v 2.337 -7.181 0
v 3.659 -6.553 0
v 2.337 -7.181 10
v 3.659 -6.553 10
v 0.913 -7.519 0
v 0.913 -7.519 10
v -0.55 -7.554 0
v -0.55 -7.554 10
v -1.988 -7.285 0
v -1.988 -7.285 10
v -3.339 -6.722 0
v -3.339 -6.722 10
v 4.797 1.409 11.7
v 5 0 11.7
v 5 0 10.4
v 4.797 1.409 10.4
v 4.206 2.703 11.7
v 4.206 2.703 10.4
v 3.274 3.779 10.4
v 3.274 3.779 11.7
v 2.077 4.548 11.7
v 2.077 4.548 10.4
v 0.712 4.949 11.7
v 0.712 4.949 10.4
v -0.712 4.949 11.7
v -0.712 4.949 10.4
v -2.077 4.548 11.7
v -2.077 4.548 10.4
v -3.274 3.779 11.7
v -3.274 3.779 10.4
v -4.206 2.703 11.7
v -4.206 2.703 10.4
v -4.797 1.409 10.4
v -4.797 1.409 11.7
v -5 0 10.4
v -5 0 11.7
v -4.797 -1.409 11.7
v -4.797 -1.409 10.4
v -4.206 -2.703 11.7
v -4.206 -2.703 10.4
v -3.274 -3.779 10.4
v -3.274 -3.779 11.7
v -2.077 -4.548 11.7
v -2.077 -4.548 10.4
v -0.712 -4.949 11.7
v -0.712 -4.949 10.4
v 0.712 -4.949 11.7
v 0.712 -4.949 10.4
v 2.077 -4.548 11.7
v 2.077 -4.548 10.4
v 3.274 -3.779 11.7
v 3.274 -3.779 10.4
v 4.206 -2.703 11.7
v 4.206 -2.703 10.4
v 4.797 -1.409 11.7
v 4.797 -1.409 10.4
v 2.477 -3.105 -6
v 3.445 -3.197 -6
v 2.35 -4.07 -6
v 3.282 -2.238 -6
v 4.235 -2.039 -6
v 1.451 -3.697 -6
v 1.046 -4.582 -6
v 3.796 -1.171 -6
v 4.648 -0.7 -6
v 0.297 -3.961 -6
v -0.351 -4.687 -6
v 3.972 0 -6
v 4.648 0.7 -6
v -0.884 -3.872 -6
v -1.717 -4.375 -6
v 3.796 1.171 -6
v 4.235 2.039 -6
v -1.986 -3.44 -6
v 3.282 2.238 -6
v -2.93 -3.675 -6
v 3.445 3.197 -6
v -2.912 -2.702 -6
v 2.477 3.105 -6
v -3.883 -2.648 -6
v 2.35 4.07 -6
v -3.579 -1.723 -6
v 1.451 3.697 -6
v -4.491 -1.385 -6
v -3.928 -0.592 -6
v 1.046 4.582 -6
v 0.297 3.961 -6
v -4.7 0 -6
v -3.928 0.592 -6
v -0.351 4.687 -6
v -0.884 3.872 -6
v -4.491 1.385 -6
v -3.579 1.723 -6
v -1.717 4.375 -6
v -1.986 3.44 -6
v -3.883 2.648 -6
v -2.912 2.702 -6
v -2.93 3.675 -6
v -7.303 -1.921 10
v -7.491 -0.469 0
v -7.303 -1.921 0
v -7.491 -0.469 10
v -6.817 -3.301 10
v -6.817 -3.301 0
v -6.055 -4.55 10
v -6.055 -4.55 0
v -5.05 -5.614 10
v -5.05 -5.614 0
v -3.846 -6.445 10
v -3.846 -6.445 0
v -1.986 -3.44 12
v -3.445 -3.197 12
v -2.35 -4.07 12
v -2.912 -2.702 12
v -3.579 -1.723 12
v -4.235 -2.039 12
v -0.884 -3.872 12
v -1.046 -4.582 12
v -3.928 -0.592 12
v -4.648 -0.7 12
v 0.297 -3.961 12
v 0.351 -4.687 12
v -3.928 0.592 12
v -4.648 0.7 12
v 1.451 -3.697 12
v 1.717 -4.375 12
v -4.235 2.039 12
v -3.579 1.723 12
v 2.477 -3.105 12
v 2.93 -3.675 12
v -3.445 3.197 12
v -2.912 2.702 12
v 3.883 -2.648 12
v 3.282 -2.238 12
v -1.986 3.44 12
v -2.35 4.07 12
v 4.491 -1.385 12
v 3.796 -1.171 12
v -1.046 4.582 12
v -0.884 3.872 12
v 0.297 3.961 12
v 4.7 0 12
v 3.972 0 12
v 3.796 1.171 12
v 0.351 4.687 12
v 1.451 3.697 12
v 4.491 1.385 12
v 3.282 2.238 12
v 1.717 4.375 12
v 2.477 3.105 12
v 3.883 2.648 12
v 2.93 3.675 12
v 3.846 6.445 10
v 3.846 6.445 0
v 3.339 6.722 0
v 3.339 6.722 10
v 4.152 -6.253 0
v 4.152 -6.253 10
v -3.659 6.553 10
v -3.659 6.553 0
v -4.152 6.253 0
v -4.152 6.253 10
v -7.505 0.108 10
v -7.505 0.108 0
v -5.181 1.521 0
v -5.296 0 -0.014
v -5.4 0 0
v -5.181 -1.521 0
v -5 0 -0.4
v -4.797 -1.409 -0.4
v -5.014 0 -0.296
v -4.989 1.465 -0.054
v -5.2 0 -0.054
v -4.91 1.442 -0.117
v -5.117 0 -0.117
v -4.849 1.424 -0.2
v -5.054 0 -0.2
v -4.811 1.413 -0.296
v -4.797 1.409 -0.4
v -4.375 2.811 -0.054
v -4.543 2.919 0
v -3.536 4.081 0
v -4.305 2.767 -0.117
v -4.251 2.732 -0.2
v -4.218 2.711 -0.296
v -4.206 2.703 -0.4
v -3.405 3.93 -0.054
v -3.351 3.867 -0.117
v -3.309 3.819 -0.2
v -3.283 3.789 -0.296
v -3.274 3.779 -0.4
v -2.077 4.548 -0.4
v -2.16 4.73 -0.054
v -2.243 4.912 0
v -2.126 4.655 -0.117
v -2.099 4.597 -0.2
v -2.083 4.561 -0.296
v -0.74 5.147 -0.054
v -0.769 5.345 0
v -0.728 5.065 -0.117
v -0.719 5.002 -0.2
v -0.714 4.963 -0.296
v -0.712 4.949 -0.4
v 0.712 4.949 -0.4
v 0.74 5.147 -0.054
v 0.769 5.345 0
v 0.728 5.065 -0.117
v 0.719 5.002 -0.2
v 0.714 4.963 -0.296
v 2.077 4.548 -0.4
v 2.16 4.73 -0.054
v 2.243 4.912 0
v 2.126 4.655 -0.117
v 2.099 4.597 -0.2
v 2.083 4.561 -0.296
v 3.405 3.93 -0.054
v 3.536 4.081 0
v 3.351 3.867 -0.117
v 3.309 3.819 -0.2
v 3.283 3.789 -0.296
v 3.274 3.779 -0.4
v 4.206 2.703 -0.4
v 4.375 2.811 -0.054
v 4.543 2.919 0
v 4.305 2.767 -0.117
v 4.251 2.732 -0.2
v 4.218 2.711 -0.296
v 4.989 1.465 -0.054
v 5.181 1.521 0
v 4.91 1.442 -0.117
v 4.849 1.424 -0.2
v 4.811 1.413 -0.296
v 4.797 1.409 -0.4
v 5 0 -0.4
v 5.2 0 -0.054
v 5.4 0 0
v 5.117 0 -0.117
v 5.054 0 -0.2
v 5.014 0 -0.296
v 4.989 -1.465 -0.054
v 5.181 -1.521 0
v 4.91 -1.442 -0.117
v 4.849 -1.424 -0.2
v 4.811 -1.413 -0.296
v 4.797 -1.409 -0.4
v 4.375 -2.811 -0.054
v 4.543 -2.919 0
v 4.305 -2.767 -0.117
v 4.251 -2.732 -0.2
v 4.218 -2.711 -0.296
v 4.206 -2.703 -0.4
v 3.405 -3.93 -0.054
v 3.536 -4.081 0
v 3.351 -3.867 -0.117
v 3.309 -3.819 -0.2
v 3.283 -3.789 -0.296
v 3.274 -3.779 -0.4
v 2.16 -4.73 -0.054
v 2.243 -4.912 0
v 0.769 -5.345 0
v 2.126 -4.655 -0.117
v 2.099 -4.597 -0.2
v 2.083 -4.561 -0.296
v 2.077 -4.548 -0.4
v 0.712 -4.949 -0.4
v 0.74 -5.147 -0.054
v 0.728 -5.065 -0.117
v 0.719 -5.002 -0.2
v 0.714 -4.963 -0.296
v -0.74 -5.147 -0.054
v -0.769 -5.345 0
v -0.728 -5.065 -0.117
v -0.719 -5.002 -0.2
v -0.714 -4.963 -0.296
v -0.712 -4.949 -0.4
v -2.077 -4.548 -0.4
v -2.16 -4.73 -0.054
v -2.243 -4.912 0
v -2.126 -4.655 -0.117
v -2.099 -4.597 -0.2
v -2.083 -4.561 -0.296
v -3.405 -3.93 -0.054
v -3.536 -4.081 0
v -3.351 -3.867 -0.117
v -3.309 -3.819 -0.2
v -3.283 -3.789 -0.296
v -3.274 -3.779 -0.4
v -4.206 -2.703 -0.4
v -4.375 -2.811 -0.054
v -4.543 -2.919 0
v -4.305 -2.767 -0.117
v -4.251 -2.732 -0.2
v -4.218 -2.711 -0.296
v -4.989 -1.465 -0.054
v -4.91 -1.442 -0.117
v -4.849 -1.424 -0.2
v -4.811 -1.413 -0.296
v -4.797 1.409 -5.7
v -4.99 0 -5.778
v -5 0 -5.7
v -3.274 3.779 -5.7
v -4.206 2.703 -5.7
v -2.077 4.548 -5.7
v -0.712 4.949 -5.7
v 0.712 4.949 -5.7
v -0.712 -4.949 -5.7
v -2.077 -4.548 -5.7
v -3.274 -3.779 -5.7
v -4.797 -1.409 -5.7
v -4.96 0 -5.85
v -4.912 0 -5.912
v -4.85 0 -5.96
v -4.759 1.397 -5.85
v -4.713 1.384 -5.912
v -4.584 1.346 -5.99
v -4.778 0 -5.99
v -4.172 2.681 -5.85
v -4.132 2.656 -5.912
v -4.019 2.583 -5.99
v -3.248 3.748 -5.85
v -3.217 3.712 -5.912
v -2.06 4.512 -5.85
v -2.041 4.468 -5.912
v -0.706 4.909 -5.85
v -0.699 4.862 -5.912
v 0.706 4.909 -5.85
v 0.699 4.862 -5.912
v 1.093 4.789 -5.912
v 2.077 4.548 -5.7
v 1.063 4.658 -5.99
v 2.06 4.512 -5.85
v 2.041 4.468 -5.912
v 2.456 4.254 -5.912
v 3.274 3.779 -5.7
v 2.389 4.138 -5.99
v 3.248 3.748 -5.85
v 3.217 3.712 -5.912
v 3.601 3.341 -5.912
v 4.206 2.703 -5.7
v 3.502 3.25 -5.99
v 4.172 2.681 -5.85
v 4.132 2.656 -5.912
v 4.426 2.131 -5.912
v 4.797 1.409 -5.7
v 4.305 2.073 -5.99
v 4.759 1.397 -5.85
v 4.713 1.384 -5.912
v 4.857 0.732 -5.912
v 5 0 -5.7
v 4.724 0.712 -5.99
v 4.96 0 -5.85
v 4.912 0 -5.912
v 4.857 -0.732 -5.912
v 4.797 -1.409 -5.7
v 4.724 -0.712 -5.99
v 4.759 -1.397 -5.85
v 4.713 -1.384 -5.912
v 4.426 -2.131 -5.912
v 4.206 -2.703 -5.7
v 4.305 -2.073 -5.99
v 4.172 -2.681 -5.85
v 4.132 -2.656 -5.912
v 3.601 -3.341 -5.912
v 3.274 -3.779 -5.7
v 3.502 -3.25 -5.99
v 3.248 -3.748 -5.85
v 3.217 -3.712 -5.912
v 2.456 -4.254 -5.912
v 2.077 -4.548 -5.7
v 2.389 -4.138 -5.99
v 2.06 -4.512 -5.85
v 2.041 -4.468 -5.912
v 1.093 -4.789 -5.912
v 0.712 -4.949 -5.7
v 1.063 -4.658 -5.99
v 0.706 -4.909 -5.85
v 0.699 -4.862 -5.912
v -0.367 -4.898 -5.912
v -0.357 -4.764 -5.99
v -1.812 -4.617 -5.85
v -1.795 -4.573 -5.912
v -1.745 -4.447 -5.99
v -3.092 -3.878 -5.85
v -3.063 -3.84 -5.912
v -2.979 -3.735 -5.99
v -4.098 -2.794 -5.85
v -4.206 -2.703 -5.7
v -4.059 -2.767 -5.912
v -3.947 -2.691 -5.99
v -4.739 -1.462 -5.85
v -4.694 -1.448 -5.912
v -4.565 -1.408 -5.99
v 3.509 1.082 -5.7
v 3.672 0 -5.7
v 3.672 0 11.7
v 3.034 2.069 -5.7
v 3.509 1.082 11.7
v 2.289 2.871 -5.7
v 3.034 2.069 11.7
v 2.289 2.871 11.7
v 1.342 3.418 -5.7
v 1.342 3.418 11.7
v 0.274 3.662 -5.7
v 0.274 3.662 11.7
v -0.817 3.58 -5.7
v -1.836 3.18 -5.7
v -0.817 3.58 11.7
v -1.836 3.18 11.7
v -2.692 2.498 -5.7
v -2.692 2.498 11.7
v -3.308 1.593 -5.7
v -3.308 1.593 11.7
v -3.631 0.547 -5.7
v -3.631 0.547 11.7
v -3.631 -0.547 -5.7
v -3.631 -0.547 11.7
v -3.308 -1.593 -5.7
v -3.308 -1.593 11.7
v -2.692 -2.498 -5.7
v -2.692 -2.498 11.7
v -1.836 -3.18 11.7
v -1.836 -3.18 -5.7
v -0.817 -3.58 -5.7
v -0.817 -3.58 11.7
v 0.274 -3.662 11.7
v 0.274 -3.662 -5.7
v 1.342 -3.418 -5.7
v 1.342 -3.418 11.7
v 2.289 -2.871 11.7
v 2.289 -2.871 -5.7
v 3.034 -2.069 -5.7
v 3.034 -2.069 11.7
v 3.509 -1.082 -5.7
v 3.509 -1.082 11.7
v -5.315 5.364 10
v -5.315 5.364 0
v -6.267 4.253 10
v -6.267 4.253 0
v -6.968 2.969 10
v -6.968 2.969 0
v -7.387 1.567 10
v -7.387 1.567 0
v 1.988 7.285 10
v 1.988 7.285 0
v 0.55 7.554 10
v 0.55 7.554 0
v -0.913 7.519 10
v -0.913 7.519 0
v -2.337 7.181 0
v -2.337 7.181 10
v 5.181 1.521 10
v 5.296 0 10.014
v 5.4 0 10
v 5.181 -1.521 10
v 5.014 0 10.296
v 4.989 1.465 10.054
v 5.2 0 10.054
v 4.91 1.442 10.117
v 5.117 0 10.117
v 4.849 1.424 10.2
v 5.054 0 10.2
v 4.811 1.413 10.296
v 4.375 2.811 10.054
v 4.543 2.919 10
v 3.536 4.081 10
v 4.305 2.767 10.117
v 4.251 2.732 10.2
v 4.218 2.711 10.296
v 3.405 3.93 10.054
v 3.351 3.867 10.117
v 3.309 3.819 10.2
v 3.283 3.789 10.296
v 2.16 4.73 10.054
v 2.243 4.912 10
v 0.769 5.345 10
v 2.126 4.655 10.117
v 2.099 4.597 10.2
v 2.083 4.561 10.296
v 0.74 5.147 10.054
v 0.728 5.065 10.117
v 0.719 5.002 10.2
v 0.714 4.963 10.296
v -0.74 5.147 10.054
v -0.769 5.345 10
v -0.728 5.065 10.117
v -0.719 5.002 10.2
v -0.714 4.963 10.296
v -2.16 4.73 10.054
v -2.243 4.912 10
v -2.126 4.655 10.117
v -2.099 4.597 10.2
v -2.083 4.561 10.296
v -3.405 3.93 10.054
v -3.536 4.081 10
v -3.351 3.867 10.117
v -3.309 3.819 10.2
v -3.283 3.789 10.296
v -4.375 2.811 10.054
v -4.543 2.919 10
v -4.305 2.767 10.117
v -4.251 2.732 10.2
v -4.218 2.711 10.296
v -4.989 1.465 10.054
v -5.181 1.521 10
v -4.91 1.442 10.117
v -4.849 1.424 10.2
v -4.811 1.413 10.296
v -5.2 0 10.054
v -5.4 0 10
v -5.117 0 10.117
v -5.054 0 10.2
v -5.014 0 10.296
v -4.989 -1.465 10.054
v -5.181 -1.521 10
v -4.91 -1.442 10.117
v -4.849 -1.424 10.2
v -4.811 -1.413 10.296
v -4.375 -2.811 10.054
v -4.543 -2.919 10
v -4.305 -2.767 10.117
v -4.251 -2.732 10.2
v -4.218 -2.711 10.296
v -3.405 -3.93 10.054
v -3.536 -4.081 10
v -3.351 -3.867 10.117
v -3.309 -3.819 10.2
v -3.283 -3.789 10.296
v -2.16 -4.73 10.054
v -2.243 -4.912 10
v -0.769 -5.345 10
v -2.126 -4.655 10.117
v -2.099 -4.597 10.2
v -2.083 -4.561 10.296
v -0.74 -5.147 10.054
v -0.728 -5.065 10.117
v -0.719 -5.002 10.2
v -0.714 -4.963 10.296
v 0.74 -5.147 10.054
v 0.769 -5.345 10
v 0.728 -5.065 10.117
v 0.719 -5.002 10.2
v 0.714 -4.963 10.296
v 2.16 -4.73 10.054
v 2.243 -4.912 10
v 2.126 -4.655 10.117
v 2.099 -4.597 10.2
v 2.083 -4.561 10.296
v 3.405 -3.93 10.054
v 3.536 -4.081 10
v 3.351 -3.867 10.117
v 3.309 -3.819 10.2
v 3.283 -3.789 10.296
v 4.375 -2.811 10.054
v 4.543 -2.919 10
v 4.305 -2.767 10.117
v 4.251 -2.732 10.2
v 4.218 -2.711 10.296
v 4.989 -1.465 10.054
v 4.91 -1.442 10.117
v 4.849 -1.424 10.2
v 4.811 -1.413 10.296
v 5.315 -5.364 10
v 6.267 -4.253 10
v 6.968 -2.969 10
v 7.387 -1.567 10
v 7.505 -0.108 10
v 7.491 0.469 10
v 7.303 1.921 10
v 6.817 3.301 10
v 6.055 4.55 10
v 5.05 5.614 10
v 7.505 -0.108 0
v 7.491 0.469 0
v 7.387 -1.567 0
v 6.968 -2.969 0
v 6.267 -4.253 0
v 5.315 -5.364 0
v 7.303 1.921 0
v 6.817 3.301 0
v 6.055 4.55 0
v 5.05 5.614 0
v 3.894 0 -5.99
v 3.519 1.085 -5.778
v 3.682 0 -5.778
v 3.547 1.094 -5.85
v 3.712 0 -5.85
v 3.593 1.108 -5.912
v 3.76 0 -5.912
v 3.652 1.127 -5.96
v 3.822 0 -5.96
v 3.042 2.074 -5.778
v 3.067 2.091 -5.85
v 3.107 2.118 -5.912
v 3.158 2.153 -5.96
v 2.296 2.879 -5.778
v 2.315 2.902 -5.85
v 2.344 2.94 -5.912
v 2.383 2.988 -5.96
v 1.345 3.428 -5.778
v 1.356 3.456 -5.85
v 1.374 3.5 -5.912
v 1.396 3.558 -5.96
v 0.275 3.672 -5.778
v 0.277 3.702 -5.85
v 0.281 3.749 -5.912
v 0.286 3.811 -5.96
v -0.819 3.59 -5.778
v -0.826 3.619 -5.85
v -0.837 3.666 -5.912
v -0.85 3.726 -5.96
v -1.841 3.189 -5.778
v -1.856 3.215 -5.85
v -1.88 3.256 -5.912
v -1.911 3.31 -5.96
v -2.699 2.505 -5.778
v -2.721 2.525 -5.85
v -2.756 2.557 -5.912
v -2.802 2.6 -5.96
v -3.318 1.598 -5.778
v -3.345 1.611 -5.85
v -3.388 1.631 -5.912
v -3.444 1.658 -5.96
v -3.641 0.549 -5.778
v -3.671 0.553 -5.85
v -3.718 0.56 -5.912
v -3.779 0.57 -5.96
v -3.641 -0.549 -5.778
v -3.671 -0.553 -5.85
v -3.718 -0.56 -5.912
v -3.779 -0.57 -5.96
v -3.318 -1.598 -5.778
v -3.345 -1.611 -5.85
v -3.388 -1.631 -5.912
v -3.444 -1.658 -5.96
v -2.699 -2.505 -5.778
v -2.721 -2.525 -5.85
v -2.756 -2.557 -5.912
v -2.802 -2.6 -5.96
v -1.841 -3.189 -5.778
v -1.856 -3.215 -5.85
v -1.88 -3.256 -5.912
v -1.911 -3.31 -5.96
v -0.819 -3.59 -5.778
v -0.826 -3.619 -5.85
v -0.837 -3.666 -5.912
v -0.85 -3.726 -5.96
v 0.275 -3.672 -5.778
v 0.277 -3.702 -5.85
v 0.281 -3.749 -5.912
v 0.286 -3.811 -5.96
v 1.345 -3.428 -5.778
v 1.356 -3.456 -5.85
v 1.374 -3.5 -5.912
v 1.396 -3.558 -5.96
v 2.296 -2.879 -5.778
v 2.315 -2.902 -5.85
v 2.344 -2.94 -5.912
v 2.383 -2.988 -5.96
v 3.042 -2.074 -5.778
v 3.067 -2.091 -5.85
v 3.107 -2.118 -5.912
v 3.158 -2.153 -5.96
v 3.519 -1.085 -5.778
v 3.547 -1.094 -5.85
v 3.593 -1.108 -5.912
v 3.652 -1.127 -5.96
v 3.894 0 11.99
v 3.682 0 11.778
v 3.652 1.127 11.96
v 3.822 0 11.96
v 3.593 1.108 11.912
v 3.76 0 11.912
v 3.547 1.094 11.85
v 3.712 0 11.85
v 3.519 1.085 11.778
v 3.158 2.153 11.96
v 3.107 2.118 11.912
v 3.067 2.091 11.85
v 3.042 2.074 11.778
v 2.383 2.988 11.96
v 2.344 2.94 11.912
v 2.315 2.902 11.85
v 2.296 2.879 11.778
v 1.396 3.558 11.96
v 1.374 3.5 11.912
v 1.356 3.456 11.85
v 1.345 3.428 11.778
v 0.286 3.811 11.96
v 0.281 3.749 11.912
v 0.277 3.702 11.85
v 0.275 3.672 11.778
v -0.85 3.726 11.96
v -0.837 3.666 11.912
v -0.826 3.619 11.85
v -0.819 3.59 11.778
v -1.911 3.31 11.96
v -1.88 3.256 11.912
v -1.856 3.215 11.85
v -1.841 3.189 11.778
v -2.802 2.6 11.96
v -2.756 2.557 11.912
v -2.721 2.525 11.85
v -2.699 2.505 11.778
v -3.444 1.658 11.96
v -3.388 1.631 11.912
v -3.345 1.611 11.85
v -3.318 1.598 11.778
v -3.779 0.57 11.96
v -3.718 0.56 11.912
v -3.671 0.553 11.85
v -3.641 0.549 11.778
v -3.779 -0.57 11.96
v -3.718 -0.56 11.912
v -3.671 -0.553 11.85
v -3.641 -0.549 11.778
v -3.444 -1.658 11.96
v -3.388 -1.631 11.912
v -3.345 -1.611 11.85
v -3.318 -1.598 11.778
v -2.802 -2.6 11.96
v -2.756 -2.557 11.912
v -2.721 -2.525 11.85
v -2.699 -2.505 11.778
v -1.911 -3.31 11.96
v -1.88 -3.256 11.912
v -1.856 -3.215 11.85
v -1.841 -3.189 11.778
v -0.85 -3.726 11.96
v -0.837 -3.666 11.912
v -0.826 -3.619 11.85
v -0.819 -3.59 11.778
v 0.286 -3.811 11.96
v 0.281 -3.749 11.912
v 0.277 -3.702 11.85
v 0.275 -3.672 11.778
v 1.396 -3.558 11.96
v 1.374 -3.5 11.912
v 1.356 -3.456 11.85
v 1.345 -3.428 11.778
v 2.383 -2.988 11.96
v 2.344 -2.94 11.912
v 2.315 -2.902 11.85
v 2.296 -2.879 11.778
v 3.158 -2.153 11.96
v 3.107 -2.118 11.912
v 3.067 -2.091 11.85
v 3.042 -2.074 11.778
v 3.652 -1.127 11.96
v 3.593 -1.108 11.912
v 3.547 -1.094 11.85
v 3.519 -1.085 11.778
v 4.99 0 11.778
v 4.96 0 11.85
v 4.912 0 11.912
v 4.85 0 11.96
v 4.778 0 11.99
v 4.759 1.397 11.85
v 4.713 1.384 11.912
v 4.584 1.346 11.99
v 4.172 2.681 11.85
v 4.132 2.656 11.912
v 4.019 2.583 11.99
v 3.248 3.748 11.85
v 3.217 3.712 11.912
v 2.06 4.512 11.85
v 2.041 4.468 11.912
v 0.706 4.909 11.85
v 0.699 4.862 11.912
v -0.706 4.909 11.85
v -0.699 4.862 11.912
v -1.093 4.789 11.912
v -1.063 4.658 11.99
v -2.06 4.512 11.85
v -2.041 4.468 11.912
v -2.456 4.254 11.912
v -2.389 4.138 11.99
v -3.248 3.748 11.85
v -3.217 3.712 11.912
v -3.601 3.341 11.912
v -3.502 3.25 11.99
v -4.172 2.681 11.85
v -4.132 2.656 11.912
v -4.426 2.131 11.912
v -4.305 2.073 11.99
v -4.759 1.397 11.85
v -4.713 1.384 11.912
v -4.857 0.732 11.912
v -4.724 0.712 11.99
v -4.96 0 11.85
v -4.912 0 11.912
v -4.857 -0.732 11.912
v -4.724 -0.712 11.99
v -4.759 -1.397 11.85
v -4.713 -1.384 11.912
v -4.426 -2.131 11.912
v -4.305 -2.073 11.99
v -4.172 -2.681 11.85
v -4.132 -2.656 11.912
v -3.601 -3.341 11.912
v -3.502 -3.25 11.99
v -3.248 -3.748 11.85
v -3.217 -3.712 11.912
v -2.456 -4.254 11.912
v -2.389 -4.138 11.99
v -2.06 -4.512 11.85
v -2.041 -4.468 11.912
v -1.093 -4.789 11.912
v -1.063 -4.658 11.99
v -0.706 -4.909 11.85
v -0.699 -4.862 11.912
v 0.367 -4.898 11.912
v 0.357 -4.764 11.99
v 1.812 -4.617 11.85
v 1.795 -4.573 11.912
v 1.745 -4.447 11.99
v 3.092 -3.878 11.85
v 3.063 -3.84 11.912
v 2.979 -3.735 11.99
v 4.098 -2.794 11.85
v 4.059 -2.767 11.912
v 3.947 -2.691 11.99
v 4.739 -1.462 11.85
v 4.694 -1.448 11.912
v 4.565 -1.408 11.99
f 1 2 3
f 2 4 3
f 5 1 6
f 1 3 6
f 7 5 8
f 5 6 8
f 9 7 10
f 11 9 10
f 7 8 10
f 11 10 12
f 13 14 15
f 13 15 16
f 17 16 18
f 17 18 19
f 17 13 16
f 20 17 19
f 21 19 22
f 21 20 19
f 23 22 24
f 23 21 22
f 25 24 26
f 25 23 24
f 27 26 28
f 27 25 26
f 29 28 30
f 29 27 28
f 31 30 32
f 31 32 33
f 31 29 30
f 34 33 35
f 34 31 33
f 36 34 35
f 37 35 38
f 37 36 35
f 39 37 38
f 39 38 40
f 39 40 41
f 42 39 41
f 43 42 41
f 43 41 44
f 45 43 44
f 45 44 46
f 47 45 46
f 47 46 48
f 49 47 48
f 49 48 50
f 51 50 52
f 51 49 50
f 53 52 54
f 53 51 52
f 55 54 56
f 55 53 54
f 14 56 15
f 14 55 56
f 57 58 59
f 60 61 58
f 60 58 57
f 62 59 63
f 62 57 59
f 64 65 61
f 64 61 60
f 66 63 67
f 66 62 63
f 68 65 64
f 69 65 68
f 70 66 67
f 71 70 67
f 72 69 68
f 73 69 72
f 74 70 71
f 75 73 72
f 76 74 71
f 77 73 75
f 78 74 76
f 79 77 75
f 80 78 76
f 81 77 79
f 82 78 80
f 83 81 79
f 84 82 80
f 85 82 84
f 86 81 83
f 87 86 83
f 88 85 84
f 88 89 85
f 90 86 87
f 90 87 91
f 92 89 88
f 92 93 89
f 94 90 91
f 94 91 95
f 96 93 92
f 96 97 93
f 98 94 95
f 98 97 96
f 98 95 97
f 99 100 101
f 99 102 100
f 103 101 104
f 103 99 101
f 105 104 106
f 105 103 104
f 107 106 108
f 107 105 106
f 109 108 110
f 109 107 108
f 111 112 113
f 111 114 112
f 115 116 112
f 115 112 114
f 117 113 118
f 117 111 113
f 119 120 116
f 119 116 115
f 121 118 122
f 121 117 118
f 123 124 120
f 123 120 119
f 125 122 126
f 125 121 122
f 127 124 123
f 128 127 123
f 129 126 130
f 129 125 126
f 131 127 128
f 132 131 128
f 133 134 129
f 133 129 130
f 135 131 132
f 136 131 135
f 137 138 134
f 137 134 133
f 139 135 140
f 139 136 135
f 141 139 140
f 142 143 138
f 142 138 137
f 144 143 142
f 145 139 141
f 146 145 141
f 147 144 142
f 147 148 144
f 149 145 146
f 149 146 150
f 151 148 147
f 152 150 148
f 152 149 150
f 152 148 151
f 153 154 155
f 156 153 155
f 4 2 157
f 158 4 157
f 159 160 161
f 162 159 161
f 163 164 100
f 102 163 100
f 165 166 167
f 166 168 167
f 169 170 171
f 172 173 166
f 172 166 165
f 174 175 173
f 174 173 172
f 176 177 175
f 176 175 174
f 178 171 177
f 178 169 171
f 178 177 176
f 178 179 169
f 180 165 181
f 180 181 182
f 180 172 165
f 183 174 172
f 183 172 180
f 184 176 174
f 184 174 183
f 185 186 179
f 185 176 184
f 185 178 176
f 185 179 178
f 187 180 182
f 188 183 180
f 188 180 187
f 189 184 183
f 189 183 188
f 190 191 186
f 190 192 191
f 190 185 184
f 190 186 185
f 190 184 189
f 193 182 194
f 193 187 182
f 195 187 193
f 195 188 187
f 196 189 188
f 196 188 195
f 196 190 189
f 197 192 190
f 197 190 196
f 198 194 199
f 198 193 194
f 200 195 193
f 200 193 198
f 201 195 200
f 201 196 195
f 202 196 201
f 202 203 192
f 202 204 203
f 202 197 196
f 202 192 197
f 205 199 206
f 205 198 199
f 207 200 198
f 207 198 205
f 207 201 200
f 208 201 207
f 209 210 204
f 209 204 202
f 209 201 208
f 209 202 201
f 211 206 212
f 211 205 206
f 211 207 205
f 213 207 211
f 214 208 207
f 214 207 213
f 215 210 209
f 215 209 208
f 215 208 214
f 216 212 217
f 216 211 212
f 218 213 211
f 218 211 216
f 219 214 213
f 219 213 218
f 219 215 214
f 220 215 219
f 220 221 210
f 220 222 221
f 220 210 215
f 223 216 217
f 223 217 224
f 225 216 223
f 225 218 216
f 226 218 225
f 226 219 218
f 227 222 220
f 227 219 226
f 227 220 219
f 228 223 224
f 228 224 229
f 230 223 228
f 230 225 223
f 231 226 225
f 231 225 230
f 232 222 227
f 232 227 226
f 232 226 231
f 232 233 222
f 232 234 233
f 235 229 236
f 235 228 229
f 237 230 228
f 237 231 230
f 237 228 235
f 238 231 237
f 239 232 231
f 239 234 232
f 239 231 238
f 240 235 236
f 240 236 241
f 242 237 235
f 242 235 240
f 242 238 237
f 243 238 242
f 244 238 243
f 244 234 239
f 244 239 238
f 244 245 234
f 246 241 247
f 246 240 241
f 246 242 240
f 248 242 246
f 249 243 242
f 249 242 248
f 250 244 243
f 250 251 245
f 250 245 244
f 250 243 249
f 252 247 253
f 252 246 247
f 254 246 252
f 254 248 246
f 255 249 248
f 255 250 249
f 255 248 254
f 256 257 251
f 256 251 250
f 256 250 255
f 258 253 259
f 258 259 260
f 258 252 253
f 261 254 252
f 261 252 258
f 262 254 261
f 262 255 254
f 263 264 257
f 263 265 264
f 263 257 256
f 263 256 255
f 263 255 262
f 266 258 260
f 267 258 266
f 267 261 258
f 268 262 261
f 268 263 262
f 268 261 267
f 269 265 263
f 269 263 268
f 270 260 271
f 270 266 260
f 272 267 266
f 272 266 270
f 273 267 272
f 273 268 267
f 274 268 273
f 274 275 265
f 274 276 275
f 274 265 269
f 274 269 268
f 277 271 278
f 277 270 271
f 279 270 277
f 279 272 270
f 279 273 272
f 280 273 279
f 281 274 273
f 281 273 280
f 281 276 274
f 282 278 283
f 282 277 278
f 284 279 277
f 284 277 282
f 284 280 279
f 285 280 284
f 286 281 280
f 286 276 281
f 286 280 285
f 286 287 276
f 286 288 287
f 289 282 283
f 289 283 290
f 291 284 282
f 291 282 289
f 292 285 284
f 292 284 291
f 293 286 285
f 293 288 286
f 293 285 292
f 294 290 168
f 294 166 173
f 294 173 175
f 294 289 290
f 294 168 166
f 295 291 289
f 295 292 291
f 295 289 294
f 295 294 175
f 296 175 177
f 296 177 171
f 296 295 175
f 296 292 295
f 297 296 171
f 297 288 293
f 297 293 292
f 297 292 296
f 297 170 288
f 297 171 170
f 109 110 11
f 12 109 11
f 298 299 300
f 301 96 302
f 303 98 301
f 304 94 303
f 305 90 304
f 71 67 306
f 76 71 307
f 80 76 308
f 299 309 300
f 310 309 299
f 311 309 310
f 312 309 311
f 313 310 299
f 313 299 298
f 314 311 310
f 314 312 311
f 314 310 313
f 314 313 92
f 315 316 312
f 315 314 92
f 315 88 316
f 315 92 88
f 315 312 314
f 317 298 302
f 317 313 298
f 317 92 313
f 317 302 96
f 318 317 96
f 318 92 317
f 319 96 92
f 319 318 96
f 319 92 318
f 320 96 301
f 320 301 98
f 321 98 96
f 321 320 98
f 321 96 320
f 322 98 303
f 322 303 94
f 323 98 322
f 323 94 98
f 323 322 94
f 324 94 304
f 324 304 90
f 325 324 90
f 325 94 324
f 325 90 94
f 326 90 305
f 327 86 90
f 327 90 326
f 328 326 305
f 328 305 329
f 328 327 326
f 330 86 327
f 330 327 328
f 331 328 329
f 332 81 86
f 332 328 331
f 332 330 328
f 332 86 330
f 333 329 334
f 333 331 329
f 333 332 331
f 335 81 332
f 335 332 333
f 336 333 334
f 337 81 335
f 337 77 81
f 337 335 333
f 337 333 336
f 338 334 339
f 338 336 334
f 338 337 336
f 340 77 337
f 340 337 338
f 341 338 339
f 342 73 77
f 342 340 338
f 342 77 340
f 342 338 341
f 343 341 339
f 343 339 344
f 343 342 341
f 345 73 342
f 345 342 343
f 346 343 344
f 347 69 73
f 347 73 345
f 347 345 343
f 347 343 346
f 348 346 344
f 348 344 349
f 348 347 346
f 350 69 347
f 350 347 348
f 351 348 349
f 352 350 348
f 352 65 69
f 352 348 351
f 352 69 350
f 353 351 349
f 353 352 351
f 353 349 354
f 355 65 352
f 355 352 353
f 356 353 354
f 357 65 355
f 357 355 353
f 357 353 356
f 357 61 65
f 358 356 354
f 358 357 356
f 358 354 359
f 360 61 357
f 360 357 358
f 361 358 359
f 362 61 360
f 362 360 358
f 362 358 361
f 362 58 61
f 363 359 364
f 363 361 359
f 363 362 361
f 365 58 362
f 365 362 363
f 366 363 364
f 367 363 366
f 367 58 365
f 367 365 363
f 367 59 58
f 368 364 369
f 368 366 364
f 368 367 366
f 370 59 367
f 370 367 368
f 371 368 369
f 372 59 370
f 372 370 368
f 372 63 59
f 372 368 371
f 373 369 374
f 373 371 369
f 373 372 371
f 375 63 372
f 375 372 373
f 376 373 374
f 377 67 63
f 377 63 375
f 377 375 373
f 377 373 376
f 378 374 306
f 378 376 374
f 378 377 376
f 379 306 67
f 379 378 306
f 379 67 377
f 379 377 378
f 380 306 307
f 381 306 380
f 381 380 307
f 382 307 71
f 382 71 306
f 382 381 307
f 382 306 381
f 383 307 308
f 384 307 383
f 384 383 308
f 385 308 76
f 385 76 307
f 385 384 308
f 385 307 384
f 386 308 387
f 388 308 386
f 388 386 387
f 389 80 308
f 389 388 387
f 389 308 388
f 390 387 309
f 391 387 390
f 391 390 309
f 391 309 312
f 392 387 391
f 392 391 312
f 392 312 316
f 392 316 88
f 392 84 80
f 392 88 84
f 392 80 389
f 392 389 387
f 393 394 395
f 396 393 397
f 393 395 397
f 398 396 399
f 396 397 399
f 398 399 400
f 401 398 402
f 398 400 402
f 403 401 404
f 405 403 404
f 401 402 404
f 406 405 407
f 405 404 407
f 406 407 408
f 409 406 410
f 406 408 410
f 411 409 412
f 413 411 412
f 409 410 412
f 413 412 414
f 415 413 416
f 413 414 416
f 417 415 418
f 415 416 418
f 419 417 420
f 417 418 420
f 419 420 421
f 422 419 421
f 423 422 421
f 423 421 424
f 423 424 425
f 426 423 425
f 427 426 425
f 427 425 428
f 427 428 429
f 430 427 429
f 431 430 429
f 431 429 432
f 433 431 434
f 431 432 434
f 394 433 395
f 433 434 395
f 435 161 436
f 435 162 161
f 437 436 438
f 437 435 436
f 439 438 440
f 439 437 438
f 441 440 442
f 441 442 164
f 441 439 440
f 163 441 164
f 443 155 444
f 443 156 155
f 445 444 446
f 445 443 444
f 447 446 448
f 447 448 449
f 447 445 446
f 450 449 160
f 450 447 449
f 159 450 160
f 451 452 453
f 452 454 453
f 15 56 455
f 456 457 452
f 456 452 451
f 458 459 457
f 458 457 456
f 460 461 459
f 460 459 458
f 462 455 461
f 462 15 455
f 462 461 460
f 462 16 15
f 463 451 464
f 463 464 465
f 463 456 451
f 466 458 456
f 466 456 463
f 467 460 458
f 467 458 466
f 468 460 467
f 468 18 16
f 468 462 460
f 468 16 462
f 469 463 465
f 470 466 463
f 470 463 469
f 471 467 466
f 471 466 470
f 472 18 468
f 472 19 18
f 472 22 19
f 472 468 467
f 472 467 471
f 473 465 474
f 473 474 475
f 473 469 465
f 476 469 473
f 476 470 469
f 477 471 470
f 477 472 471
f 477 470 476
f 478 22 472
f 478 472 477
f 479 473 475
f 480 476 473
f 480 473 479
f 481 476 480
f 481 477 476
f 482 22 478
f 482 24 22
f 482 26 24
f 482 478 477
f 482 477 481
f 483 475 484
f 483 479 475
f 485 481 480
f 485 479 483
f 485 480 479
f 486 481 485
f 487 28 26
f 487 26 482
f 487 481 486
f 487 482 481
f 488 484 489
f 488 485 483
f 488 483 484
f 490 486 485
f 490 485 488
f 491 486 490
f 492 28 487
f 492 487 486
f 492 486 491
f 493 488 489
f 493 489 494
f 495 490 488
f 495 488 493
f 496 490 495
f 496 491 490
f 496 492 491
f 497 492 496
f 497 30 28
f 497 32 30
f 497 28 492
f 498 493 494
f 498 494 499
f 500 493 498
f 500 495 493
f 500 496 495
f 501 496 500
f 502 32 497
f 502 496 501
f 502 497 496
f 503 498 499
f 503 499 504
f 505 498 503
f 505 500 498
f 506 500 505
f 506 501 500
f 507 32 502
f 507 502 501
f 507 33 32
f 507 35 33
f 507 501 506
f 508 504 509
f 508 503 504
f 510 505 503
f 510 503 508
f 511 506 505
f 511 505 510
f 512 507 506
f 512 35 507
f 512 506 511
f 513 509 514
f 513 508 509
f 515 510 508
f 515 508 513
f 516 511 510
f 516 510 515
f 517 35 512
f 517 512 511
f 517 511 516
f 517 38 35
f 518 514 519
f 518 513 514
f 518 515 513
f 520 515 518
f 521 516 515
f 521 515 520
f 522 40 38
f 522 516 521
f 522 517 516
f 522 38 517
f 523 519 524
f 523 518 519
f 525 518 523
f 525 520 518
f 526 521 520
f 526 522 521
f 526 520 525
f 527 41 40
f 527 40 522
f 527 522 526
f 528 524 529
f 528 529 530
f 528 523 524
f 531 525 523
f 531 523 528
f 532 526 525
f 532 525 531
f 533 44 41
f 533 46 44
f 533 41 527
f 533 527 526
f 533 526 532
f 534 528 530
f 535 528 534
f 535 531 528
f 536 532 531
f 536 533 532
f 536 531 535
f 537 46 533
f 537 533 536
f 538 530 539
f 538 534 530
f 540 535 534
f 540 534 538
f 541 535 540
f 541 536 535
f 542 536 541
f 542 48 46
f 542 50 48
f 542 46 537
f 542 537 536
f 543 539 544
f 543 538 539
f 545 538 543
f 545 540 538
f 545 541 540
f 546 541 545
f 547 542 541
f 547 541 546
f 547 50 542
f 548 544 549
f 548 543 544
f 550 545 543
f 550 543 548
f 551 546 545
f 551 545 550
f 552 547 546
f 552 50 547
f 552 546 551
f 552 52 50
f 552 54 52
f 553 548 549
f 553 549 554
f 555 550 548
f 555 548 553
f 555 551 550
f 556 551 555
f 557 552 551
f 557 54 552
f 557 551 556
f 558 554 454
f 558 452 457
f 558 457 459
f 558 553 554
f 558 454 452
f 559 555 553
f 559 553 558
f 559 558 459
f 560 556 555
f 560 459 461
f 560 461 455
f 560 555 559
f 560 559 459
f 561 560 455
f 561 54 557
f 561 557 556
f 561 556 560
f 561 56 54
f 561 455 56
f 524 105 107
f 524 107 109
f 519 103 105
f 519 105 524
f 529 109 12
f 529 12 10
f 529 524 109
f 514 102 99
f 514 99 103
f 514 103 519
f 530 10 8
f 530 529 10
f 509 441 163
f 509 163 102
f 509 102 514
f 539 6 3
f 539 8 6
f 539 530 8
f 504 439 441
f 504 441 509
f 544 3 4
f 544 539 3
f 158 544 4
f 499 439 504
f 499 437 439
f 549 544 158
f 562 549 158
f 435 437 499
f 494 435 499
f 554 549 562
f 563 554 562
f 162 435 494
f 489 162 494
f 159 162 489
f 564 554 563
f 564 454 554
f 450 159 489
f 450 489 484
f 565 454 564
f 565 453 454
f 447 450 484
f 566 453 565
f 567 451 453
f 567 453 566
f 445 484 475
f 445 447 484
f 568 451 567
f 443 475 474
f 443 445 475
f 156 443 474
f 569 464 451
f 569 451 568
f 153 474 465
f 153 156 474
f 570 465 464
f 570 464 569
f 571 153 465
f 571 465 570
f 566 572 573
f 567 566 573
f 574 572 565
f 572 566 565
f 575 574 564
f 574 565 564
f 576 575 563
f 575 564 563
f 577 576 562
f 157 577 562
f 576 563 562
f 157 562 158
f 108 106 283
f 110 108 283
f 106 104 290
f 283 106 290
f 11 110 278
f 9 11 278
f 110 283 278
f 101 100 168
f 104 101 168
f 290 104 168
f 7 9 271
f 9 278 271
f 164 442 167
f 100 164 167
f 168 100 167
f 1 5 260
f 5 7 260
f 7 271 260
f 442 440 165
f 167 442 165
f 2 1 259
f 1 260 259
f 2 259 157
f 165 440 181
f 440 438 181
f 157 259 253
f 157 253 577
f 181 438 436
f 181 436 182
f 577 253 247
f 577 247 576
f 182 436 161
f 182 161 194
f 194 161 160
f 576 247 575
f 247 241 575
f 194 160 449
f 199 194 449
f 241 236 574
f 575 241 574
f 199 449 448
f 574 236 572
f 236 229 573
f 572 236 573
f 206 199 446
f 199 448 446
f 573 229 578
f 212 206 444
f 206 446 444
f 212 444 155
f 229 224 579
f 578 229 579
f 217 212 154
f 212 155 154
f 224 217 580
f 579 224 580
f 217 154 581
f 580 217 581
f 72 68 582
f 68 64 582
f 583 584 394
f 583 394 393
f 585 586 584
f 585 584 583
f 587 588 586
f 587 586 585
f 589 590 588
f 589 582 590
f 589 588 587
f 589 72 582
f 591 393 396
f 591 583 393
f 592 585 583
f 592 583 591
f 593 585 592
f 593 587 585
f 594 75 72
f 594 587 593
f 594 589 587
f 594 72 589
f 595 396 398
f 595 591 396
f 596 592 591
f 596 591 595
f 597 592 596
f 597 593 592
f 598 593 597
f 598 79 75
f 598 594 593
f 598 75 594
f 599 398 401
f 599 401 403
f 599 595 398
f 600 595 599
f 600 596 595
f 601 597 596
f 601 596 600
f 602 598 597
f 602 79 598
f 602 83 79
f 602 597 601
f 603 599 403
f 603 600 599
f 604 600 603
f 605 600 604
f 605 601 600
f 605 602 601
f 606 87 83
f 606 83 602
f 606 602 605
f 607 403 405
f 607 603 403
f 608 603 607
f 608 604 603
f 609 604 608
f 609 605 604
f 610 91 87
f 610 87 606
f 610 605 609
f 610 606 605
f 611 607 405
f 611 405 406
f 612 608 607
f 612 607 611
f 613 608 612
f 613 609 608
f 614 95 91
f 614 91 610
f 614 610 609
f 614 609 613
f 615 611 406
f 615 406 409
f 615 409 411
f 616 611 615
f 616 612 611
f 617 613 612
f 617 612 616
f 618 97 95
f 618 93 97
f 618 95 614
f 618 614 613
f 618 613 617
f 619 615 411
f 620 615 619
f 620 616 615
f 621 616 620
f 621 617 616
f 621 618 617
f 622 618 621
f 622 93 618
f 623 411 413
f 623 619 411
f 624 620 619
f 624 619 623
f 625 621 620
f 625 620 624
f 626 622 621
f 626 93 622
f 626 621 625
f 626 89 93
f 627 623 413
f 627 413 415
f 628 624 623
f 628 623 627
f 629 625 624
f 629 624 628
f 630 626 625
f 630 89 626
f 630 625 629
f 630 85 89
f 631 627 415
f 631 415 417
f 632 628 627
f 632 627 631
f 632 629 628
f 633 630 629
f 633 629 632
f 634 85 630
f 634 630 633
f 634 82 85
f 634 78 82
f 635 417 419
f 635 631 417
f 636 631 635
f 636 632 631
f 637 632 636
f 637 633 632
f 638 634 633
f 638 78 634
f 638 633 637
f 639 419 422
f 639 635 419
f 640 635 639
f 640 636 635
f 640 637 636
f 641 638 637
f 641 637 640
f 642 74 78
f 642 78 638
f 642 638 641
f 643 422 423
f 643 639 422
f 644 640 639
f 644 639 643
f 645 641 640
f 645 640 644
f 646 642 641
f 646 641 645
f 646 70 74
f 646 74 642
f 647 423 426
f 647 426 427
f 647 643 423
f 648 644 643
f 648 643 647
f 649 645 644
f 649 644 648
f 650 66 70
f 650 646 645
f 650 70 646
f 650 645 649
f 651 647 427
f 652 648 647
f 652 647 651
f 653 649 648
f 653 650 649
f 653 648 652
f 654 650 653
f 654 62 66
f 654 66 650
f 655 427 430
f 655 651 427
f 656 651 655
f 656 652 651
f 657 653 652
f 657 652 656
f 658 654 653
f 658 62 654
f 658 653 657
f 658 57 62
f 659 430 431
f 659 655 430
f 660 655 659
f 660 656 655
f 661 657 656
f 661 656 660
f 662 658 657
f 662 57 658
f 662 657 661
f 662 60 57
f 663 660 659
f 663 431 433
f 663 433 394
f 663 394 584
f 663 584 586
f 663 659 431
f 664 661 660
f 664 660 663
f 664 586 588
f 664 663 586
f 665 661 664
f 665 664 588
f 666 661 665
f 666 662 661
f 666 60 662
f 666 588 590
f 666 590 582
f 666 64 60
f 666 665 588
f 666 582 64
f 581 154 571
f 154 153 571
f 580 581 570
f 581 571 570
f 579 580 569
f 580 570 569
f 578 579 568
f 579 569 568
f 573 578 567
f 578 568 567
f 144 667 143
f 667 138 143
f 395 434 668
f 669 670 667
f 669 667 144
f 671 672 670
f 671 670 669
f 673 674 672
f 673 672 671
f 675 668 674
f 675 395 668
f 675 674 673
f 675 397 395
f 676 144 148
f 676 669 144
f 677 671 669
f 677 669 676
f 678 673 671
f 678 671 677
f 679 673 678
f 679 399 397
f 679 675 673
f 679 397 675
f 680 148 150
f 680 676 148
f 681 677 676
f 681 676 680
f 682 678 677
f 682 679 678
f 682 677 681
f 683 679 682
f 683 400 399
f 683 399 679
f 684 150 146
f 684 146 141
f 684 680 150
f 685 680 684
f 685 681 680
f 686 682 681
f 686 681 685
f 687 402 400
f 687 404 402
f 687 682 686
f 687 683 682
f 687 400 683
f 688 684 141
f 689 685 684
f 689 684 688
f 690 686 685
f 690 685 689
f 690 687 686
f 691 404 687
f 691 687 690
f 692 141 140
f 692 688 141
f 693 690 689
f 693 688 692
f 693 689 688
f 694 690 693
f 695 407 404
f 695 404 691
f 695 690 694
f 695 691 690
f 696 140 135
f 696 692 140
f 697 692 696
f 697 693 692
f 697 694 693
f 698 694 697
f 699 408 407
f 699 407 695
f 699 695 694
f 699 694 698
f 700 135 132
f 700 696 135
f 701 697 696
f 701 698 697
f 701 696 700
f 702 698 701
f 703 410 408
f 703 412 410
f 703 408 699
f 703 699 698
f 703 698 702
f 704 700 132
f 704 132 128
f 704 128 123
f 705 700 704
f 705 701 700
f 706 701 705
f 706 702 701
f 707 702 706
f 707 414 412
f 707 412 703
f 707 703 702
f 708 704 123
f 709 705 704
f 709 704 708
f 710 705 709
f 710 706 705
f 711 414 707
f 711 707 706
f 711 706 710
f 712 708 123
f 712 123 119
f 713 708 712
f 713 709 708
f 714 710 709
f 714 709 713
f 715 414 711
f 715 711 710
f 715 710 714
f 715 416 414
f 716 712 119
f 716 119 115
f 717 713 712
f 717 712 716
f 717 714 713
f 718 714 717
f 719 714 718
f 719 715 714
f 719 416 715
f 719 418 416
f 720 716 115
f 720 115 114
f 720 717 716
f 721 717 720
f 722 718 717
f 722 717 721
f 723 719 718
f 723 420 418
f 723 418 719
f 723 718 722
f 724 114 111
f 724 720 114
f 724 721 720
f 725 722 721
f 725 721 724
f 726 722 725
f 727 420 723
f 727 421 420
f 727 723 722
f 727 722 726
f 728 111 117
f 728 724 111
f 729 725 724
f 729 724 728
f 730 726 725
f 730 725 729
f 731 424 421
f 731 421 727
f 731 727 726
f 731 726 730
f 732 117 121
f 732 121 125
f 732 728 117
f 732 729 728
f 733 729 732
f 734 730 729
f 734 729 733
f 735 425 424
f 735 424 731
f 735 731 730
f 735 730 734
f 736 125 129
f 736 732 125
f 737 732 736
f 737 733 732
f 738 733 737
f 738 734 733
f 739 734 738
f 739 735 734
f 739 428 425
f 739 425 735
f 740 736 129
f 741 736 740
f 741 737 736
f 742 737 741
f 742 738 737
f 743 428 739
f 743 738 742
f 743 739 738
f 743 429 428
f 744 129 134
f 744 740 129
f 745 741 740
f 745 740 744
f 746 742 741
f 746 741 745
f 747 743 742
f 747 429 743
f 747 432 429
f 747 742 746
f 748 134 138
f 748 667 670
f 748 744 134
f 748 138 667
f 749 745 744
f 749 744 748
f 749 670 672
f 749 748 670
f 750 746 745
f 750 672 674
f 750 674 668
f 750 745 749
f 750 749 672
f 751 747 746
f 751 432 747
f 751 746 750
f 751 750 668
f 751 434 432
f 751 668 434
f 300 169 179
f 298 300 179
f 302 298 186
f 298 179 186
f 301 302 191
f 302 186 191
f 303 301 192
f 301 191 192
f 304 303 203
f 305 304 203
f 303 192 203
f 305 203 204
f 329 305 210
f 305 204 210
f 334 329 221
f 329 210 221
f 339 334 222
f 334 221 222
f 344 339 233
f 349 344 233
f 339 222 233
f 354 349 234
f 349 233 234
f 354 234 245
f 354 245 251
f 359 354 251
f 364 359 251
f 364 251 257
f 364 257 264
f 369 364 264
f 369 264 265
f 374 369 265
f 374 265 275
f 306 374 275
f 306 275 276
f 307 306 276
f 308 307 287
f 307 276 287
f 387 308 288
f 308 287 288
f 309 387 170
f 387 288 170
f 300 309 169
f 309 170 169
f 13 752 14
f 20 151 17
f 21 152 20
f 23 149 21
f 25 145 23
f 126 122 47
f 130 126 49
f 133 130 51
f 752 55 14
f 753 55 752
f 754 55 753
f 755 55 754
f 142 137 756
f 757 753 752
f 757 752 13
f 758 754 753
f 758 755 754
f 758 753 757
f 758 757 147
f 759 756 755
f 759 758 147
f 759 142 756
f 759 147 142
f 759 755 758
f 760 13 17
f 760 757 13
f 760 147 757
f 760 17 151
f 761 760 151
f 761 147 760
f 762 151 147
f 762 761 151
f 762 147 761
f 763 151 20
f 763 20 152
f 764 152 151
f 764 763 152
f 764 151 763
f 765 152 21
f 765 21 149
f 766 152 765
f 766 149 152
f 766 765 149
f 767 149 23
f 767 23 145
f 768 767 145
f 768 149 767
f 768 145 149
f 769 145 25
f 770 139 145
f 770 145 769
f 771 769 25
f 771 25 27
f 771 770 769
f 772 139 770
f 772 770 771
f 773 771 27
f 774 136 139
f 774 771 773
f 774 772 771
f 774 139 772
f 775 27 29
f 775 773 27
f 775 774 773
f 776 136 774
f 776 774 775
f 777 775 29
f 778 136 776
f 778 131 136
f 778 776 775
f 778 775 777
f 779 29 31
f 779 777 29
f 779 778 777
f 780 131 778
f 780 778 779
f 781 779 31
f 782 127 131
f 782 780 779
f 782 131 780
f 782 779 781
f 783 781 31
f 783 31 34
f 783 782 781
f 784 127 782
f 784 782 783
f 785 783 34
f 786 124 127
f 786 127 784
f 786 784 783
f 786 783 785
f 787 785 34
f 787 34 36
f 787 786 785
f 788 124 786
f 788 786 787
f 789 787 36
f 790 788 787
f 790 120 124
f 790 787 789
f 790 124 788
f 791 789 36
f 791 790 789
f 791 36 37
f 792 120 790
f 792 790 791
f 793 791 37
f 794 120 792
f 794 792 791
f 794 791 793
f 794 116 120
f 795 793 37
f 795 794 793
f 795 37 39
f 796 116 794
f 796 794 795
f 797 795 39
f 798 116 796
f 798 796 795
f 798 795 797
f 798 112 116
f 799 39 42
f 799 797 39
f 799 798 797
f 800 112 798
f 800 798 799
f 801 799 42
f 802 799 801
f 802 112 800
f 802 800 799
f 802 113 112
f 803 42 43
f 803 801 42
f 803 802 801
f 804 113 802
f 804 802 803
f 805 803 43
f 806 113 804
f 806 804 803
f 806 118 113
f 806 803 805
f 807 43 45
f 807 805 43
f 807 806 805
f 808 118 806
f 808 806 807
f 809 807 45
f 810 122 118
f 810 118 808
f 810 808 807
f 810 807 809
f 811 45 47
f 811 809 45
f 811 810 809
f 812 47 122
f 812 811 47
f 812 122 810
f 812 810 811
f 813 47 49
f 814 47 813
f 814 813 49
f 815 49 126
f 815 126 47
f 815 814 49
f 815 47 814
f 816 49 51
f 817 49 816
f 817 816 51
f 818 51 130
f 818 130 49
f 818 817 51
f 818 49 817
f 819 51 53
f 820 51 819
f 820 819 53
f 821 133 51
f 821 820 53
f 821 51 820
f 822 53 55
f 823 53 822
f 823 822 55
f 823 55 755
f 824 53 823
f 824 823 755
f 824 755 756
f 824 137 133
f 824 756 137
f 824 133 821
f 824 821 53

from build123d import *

# Parameters (mm, degrees)
BOSS_EXTRUDE1_DEPTH = 10
SKETCH2_R           = 5
BOSS_EXTRUDE2_DEPTH = 6
FILLET1_R           = 0.4
BOSS_EXTRUDE3_START = 2
SKETCH3_R           = 5
BOSS_EXTRUDE3_DEPTH = 2
FILLET3_R           = 0.4
SKETCH4_R           = 3.67200106
CUT_EXTRUDE1_DEPTH  = 18
FILLET4_R           = 0.3
FILLET5_R           = 7


with BuildPart() as part:
    # Sketch1 → Boss-Extrude1 (new body)
    with BuildSketch(Plane.XY):
        Polygon((7.393488137, 4.509582372), (-0.208668827, 8.657739735), (-7.602156963, 4.148157363), (-7.393488137, -4.509582372), (0.208668827, -8.657739735), (7.602156963, -4.148157363), align=None)
    extrude(amount=BOSS_EXTRUDE1_DEPTH)

    # Sketch2 → Boss-Extrude2 (add)
    with BuildSketch(Plane(origin=(0, 0, 0), x_dir=(-1, 0, 0), z_dir=(0, 0, -1))):
        Circle(SKETCH2_R)
    extrude(amount=BOSS_EXTRUDE2_DEPTH)

    # Fillet1
    fillet1_edges = [part.edges().sort_by_distance(p)[0] for p in [
        (5, 0, 0),
    ]]
    fillet(fillet1_edges, radius=FILLET1_R)

    # Sketch3 → Boss-Extrude3 (add)
    with BuildSketch(Plane.XY.offset(10).offset(BOSS_EXTRUDE3_START)):
        Circle(SKETCH3_R)
    extrude(amount=-BOSS_EXTRUDE3_DEPTH)

    # Fillet3
    fillet3_edges = [part.edges().sort_by_distance(p)[0] for p in [
        (-5, 0, 10),
    ]]
    fillet(fillet3_edges, radius=FILLET3_R)

    # Sketch4 → Cut-Extrude1 (cut)
    with BuildSketch(Plane.XY.offset(12)):
        Circle(SKETCH4_R)
    extrude(amount=-CUT_EXTRUDE1_DEPTH, mode=Mode.SUBTRACT)

    # Fillet4
    fillet4_edges = [part.edges().sort_by_distance(p)[0] for p in [
        (5, 0, -6),
        (-5, 0, 12),
        (-3.67200106, 0, -6),
        (-3.67200106, 0, 12),
    ]]
    fillet(fillet4_edges, radius=FILLET4_R)

    # Fillet5
    fillet5_edges = [part.edges().sort_by_distance(p)[0] for p in [
        (7.602156963, -4.148157363, 5),
        (0.208668827, -8.657739735, 5),
        (-7.393488137, -4.509582372, 5),
        (-7.602156963, 4.148157363, 5),
        (-0.208668827, 8.657739735, 5),
        (7.393488137, 4.509582372, 5),
    ]]
    fillet(fillet5_edges, radius=FILLET5_R)


solid = part.part
